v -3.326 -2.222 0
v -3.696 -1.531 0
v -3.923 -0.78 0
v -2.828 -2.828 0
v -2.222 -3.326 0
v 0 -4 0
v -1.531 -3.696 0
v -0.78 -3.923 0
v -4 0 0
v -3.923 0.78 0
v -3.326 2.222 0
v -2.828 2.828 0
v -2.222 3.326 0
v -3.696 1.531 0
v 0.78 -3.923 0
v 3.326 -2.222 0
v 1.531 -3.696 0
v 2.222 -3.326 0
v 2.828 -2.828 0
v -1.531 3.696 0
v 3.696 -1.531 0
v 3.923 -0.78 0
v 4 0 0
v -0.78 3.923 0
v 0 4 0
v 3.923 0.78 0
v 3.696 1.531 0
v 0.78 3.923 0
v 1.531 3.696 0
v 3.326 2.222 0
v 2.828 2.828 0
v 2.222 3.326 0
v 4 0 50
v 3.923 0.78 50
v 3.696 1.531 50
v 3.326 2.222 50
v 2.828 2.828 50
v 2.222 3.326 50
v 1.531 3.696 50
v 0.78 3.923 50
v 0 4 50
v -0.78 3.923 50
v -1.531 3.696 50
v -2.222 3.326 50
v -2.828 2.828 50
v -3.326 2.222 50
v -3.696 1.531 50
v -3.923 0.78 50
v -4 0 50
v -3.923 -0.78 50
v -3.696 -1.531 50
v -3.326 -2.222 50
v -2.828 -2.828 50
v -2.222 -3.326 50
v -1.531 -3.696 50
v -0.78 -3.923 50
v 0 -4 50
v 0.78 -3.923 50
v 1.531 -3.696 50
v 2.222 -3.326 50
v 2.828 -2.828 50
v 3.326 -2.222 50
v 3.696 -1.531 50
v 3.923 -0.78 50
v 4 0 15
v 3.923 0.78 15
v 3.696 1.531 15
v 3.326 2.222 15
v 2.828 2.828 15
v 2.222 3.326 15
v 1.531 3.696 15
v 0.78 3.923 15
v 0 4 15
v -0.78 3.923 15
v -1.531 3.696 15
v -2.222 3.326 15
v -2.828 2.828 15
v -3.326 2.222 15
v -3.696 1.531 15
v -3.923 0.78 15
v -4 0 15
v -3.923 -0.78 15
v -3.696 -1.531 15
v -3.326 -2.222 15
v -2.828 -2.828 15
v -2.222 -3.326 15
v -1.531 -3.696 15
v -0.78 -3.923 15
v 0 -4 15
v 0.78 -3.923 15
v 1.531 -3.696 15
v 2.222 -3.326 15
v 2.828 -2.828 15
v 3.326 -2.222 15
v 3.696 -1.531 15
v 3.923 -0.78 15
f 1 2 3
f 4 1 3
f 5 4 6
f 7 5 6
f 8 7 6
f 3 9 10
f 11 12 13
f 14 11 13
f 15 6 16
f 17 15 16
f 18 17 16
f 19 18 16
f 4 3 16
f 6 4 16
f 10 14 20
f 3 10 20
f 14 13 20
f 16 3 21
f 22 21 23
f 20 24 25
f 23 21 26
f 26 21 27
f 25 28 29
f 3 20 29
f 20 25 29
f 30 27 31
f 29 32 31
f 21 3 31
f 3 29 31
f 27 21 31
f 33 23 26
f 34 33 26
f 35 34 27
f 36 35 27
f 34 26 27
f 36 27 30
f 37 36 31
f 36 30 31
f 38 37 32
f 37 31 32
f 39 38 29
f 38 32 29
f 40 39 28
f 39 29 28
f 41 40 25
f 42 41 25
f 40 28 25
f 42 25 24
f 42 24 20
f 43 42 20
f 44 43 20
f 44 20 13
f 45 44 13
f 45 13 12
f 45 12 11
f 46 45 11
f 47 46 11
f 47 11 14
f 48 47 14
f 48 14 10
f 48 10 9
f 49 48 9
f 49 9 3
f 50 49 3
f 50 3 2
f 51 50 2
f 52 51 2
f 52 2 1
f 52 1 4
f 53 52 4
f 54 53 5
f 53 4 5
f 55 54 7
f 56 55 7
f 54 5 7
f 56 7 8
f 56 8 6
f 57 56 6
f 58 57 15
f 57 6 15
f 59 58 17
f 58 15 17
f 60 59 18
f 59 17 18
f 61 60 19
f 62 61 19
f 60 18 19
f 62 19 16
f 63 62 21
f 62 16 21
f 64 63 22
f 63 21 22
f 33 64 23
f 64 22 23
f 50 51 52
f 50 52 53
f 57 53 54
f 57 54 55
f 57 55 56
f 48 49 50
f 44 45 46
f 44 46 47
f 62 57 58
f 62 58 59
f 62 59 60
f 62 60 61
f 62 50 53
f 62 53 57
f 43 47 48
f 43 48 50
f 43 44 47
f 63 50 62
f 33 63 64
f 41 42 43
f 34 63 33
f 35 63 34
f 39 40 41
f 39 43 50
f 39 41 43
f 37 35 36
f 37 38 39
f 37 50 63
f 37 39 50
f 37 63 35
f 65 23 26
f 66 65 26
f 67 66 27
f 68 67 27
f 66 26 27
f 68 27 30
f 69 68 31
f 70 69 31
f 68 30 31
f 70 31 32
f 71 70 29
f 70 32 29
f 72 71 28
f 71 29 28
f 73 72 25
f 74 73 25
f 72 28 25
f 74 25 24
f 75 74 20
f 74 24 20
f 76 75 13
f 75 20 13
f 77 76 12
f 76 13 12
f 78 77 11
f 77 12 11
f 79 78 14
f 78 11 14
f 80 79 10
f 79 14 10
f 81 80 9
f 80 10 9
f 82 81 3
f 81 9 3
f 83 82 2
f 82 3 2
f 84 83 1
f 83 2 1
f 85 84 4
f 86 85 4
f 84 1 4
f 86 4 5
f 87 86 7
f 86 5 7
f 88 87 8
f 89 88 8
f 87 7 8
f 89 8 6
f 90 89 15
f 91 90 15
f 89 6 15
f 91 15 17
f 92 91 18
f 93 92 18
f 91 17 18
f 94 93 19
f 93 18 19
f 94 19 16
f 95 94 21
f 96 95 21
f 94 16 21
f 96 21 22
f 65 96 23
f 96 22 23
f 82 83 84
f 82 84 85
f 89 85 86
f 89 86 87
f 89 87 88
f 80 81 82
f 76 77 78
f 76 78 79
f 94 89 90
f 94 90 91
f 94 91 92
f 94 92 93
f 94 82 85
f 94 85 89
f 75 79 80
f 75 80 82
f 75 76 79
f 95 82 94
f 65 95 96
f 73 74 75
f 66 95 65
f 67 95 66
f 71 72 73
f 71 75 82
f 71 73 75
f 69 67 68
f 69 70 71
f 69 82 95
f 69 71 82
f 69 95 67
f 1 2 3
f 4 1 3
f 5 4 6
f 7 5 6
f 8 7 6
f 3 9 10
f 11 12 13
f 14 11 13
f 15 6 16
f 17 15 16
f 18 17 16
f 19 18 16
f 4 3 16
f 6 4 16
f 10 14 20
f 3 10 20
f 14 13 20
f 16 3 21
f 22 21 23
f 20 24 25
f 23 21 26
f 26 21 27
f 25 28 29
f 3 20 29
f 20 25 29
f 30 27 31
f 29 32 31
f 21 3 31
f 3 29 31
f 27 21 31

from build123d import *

# Parameters (mm, degrees)
SKETCH_1_R      = 4
EXTRUDE_1_DEPTH = 15
SKETCH_2_R      = 4
EXTRUDE_2_DEPTH = 50
SKETCH_4_R      = 4
EXTRUDE_3_DEPTH = 20


with BuildPart() as part:
    # 草图1 → 凸台-拉伸1 (new body)
    with BuildSketch(Plane.XY):
        Circle(SKETCH_1_R)
    extrude(amount=EXTRUDE_1_DEPTH)


with BuildPart() as body_2:
    # 草图2 → 凸台-拉伸2 (new body)
    with BuildSketch(Plane.XY):
        Circle(SKETCH_2_R)
    extrude(amount=EXTRUDE_2_DEPTH)

    # 草图4 → 凸台-拉伸3 (add)
    with BuildSketch(Plane.XY):
        Circle(SKETCH_4_R)
    extrude(amount=EXTRUDE_3_DEPTH)


solid = Compound([part.part, body_2.part])
